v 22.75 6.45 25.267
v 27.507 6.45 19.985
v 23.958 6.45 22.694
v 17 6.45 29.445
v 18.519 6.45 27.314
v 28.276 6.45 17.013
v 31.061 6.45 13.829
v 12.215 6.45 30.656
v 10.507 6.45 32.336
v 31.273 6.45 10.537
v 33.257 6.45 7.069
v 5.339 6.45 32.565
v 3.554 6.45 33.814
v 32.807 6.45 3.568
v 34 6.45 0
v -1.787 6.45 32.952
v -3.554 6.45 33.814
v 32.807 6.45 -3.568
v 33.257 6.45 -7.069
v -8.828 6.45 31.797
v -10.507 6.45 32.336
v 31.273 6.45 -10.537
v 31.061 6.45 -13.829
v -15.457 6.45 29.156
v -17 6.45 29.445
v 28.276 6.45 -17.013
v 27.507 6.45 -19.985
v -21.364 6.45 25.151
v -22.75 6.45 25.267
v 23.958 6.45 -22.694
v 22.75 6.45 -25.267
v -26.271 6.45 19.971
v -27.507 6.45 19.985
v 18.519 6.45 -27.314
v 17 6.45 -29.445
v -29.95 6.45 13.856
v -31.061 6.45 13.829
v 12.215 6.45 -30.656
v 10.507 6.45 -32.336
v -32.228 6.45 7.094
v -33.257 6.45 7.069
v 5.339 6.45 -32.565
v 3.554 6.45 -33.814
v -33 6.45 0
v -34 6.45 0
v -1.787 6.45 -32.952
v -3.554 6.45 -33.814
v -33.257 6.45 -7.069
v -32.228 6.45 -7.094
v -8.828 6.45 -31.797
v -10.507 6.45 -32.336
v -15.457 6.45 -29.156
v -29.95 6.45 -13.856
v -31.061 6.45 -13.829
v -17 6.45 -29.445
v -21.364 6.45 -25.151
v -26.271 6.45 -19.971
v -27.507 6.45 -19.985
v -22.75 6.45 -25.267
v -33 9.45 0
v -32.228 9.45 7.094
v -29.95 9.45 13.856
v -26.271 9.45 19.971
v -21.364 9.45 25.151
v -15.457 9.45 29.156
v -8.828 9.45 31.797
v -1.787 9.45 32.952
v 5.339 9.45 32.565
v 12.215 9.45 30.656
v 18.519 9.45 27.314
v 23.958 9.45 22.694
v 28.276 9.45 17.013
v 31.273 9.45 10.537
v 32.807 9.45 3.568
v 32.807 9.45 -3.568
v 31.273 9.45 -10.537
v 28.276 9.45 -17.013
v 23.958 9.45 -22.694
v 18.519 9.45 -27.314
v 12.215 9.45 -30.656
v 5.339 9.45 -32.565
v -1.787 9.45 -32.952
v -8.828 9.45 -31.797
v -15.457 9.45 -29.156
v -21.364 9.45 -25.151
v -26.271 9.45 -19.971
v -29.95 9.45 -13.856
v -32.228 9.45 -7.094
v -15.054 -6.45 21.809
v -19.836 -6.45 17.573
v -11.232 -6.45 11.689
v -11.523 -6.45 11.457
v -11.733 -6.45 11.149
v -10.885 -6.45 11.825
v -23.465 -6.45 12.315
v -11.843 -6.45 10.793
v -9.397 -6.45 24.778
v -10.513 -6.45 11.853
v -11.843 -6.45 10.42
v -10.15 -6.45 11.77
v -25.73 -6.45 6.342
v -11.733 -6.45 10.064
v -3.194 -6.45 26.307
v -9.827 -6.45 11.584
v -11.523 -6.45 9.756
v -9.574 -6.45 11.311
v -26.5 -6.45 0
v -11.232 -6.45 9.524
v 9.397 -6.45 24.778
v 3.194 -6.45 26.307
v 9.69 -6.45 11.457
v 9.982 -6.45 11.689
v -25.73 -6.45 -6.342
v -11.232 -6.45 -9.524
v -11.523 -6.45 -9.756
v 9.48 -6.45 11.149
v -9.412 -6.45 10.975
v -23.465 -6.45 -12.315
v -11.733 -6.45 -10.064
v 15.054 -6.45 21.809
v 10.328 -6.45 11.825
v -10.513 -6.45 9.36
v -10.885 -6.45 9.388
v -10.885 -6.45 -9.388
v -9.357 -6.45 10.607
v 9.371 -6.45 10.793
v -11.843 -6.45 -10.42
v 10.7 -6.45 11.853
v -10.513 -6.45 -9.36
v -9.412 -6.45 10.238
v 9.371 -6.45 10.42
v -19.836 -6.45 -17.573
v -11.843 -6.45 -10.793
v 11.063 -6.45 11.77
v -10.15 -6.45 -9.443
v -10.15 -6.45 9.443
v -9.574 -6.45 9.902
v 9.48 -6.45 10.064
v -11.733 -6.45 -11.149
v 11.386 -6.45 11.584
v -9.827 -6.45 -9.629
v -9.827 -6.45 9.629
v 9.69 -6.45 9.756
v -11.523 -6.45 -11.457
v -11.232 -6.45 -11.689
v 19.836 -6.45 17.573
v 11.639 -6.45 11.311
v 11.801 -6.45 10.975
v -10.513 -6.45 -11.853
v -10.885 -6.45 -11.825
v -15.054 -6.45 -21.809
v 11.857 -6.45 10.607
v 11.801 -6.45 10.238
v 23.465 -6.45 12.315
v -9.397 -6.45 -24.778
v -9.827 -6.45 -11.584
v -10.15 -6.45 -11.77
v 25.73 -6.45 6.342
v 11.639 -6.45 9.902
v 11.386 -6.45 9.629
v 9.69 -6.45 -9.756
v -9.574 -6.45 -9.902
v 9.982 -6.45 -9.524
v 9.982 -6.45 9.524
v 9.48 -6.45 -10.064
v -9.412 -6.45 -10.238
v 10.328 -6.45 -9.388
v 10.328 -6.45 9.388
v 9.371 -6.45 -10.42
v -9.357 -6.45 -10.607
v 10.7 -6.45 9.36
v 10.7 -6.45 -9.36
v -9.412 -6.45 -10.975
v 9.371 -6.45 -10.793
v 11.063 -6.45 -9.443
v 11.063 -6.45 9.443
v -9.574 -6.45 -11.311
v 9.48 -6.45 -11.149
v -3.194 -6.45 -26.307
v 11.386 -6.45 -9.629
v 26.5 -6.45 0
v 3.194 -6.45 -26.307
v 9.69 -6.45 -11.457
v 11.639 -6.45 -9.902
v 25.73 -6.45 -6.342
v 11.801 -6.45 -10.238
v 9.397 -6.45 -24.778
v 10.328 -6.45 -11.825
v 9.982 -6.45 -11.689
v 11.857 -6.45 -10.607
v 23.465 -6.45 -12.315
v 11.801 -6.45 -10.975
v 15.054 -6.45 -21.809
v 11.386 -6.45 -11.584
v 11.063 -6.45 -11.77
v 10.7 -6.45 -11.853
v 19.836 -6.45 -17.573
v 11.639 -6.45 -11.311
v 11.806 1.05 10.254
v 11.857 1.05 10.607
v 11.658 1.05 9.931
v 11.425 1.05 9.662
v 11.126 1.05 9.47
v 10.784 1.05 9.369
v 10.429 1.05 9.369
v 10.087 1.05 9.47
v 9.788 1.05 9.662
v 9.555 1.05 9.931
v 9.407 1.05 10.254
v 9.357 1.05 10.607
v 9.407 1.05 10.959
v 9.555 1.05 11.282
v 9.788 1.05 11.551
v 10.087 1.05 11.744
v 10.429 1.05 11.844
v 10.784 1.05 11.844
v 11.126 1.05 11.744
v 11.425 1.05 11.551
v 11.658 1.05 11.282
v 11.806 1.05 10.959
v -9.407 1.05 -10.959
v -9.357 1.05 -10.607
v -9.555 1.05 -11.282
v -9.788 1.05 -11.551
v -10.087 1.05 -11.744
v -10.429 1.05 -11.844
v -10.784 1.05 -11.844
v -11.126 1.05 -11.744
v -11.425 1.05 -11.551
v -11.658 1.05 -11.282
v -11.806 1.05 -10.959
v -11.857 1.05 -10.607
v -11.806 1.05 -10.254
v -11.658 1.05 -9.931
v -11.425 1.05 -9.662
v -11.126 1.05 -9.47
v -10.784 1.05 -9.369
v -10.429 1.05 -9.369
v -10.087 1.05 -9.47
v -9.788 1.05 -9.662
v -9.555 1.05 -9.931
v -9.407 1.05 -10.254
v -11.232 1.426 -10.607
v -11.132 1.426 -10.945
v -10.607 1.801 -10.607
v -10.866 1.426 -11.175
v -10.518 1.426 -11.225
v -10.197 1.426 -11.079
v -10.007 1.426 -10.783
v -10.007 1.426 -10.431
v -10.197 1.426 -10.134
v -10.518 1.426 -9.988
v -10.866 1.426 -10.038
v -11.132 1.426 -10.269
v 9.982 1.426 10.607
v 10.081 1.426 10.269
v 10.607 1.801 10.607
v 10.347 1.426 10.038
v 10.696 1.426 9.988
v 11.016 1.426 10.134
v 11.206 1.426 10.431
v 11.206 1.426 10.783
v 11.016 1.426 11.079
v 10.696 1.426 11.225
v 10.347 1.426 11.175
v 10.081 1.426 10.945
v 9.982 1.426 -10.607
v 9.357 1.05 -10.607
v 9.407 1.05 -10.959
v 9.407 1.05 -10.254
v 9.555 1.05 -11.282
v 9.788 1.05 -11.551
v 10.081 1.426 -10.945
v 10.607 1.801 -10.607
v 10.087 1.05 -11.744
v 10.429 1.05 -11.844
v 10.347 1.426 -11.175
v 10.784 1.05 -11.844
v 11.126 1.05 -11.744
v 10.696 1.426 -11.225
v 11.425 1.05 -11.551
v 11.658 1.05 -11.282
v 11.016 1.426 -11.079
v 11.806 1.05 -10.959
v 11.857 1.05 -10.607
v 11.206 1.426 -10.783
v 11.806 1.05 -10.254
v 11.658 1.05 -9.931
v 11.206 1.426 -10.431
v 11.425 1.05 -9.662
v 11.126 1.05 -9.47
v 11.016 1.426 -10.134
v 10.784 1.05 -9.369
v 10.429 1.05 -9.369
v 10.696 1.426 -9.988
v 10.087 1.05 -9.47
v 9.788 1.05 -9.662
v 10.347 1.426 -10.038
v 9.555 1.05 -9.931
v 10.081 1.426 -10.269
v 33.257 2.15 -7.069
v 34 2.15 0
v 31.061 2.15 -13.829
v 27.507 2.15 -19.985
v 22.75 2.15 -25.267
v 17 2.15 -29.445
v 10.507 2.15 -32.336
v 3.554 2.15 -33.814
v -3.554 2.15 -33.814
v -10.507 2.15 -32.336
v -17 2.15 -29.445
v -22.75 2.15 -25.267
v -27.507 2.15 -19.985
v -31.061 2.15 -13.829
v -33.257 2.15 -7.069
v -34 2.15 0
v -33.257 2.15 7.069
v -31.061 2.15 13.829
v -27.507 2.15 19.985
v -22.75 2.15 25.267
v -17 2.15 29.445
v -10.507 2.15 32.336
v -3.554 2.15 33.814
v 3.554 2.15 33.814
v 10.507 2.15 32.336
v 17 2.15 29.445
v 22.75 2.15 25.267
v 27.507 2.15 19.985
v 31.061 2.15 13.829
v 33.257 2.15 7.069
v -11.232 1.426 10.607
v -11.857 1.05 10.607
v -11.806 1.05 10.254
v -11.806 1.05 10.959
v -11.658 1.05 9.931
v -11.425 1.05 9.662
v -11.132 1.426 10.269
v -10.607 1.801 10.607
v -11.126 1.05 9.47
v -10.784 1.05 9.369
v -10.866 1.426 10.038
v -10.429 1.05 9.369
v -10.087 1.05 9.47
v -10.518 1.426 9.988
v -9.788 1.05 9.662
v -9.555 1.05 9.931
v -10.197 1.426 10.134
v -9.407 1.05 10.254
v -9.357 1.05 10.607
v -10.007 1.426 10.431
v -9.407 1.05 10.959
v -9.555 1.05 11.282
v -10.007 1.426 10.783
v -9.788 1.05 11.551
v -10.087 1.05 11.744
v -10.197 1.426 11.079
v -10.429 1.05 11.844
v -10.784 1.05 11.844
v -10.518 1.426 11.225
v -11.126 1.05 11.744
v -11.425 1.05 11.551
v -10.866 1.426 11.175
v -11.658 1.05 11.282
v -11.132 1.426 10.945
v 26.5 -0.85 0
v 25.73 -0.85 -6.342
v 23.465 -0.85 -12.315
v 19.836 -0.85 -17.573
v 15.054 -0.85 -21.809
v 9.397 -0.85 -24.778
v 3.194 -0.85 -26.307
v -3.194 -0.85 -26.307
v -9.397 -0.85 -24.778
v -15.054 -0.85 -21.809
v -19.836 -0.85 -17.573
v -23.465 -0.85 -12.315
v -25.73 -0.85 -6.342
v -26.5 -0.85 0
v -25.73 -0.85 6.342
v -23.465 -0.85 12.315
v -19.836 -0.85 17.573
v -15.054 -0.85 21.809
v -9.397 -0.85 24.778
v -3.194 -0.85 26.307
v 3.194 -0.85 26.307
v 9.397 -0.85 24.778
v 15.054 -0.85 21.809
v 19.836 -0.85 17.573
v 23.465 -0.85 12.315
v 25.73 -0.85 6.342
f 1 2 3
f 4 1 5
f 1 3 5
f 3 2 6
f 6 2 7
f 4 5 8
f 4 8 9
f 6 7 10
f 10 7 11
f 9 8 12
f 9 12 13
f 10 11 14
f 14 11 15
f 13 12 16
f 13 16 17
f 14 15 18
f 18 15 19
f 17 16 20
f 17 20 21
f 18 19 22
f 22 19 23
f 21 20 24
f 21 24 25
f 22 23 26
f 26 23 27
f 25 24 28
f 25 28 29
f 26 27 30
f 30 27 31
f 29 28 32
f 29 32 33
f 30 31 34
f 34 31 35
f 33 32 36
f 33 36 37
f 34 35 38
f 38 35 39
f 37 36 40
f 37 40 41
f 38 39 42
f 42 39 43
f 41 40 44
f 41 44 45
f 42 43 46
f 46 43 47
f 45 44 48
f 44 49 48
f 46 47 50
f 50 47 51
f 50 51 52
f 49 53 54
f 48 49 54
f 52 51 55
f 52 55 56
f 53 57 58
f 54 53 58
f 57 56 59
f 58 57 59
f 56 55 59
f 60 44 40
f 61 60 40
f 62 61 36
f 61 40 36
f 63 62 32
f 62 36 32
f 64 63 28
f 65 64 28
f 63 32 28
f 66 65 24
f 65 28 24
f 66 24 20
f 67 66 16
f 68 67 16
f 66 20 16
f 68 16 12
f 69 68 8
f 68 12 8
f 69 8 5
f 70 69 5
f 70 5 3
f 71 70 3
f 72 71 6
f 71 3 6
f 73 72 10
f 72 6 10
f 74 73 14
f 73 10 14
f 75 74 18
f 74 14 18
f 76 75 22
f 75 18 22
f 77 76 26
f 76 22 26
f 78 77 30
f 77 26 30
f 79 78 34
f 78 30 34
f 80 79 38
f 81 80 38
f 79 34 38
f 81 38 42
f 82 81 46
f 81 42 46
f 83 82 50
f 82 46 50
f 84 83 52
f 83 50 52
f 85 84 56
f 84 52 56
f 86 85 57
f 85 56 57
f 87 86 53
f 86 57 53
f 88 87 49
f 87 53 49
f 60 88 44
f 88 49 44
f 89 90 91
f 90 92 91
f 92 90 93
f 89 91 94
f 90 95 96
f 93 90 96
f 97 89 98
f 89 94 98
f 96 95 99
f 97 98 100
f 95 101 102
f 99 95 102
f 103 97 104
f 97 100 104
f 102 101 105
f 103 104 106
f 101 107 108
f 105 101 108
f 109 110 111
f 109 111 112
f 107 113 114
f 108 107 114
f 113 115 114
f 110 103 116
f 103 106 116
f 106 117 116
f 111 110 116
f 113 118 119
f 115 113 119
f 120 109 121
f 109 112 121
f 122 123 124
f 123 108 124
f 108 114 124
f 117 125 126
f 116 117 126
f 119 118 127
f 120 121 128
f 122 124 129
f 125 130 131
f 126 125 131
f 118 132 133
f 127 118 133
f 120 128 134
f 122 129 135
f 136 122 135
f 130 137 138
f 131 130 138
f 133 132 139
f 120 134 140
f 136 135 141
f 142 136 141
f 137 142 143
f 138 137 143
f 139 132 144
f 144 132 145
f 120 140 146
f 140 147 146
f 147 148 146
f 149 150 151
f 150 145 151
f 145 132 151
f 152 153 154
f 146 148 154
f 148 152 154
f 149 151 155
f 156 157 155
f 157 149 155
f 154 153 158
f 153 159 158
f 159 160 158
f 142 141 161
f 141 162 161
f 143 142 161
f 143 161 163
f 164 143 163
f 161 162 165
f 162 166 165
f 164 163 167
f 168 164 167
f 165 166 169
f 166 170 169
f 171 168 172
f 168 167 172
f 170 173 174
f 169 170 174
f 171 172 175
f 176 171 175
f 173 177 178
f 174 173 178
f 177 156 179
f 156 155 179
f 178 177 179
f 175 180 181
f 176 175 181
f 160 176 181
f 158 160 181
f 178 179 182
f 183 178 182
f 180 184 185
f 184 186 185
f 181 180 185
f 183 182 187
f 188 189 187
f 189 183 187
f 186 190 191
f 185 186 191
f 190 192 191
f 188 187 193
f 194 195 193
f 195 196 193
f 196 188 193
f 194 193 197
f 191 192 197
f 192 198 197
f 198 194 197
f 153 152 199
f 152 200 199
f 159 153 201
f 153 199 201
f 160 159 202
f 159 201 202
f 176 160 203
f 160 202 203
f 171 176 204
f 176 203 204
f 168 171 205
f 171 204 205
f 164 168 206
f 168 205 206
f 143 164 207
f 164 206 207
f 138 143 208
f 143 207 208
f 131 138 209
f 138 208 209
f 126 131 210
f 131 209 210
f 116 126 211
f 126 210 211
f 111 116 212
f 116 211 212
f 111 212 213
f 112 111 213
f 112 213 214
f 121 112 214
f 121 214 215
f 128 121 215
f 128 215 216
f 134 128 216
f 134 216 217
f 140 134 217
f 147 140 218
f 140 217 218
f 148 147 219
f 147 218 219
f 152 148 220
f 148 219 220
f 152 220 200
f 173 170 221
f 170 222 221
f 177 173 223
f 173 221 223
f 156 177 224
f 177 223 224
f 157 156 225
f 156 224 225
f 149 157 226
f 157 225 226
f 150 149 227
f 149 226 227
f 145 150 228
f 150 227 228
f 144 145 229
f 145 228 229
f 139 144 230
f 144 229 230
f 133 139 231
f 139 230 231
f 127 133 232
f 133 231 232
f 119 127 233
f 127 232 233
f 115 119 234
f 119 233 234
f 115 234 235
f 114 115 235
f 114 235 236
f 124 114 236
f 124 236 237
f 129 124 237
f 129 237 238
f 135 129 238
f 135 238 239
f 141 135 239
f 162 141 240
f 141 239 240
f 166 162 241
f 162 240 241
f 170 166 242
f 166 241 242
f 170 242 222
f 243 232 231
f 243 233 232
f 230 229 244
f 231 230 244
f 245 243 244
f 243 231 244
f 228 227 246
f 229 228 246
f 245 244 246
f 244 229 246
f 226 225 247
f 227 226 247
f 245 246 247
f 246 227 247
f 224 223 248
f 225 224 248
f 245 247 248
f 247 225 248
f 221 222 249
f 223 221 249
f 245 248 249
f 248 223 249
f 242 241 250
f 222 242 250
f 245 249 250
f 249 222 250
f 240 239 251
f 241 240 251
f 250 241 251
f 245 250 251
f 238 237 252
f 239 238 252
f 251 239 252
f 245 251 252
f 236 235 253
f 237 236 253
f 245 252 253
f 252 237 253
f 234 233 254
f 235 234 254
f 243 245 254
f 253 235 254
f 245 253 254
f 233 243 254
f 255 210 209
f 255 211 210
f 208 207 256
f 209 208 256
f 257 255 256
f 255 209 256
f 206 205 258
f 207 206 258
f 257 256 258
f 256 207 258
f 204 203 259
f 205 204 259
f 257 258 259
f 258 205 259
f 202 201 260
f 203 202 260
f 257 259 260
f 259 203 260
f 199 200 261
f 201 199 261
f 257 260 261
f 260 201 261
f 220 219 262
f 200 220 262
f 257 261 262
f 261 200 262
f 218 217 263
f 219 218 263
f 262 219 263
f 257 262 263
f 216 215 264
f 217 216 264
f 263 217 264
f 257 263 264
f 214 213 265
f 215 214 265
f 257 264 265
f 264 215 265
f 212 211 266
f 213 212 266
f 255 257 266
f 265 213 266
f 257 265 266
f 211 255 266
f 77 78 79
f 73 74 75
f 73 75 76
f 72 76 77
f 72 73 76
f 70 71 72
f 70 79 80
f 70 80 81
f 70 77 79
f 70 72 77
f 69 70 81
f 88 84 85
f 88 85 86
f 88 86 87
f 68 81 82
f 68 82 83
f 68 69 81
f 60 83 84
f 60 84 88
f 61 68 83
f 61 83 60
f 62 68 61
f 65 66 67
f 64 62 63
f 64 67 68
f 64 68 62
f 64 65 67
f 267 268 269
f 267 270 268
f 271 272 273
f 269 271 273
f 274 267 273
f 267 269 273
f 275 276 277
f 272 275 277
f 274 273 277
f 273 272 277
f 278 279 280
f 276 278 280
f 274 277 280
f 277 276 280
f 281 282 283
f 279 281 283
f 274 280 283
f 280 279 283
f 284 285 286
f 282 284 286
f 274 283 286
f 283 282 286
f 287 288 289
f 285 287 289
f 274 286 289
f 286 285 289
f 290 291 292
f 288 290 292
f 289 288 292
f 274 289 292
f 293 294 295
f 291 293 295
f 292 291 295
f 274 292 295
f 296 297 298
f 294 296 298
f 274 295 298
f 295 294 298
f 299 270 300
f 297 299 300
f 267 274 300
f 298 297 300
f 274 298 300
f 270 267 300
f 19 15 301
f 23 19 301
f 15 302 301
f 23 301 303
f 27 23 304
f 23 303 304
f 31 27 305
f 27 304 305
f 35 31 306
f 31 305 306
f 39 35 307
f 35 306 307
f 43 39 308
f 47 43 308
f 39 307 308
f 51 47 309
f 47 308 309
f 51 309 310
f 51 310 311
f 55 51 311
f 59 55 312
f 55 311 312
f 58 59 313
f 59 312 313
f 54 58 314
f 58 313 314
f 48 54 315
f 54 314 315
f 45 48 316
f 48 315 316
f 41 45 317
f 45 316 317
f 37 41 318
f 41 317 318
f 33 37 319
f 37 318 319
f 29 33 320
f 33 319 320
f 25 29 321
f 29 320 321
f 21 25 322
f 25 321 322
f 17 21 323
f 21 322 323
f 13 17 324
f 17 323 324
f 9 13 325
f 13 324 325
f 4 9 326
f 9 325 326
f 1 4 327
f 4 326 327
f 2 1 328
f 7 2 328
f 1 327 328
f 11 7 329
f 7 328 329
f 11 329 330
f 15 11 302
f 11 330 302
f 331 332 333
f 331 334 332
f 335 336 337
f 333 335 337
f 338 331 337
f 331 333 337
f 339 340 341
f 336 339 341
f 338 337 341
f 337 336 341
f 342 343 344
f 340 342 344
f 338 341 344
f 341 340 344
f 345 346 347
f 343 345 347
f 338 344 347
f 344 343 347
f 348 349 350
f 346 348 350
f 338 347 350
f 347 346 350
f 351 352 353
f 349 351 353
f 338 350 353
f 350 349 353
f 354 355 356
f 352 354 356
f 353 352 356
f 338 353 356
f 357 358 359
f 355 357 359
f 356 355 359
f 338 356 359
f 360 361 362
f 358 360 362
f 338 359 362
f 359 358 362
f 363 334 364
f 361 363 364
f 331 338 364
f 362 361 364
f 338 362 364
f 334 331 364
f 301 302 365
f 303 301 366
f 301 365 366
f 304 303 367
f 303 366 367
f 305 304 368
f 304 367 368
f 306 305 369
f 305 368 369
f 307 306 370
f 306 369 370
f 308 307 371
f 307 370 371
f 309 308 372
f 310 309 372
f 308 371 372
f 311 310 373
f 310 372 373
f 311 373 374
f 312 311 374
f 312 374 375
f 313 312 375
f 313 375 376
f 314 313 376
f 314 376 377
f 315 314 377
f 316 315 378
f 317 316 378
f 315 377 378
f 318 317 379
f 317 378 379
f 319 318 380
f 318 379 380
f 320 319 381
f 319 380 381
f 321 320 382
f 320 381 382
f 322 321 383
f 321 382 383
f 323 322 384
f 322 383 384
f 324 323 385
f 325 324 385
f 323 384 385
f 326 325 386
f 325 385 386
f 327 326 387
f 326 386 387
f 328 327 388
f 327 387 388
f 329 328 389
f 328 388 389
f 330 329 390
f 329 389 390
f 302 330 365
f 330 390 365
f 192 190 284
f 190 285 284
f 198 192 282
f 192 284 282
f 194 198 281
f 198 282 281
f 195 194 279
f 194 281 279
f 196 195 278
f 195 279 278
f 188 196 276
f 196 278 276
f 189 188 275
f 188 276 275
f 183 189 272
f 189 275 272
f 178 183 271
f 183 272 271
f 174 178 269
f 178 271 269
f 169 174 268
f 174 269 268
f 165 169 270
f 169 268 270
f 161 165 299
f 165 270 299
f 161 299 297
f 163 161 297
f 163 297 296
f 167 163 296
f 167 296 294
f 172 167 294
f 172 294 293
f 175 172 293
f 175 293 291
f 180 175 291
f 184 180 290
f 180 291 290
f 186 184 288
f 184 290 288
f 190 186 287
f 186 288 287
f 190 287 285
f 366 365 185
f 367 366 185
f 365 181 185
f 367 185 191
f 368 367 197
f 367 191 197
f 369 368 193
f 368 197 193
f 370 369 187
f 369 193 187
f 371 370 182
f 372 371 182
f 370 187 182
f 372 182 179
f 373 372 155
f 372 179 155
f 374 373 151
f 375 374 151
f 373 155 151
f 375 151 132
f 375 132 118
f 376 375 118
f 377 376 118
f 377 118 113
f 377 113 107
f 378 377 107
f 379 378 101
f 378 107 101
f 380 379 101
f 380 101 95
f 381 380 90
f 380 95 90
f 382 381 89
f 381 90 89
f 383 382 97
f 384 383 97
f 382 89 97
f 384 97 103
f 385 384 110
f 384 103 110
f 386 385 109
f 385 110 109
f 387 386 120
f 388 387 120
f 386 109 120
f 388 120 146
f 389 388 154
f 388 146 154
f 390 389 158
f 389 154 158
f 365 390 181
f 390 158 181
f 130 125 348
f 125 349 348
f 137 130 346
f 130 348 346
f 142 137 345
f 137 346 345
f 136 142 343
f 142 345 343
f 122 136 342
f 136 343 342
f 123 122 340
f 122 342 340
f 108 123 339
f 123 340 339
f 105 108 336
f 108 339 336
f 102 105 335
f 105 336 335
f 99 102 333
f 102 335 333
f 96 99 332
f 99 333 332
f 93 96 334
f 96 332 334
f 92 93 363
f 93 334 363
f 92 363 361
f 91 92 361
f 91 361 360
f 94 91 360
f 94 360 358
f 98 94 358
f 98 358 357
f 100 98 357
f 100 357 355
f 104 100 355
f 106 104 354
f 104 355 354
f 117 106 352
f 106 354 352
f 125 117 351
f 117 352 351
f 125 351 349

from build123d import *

# Parameters (mm, degrees)
SKETCH3_R                 = 33
BOSS_EXTRUDE1_DEPTH       = 3
M3X0_5_TAPPED_HOLE1_D     = 2.5
M3X0_5_TAPPED_HOLE1_DEPTH = 7.5
M3X0_5_TAPPED_HOLE1_TIP   = 0.751075774


with BuildPart() as part:
    # Sketch2 → Revolve1 (revolve)
    with BuildSketch(Plane.XY):
        Polygon((0, -6.45), (0, 6.45), (34, 6.45), (34, 2.15), (26.5, -0.85), (26.5, -6.45), align=None)
    revolve(axis=Axis((0, -6.45, 0), (0, 1, 0)))

    # Sketch3 → Boss-Extrude1 (add)
    with BuildSketch(Plane(origin=(0, 6.45, 0), x_dir=(1, 0, 0), z_dir=(0, 1, 0))):
        with Locations(Location((0, 0, 0), (0, 0, 180))):
            Circle(SKETCH3_R)
    extrude(amount=BOSS_EXTRUDE1_DEPTH)

    # M3x0.5 Tapped Hole1
    with Locations(Plane(origin=(0, -6.45, 0), x_dir=(-1, 0, 0), z_dir=(0, -1, 0))):
        with Locations((10.606601718, -10.606601718), (-10.606601718, -10.606601718), (-10.606601718, 10.606601718), (10.606601718, 10.606601718)):
            Hole(M3X0_5_TAPPED_HOLE1_D / 2, depth=M3X0_5_TAPPED_HOLE1_DEPTH)
            with Locations((0, 0, -(M3X0_5_TAPPED_HOLE1_DEPTH + M3X0_5_TAPPED_HOLE1_TIP / 2))):  # 118° drill point
                Cone(0, M3X0_5_TAPPED_HOLE1_D / 2, M3X0_5_TAPPED_HOLE1_TIP, mode=Mode.SUBTRACT)


solid = part.part
